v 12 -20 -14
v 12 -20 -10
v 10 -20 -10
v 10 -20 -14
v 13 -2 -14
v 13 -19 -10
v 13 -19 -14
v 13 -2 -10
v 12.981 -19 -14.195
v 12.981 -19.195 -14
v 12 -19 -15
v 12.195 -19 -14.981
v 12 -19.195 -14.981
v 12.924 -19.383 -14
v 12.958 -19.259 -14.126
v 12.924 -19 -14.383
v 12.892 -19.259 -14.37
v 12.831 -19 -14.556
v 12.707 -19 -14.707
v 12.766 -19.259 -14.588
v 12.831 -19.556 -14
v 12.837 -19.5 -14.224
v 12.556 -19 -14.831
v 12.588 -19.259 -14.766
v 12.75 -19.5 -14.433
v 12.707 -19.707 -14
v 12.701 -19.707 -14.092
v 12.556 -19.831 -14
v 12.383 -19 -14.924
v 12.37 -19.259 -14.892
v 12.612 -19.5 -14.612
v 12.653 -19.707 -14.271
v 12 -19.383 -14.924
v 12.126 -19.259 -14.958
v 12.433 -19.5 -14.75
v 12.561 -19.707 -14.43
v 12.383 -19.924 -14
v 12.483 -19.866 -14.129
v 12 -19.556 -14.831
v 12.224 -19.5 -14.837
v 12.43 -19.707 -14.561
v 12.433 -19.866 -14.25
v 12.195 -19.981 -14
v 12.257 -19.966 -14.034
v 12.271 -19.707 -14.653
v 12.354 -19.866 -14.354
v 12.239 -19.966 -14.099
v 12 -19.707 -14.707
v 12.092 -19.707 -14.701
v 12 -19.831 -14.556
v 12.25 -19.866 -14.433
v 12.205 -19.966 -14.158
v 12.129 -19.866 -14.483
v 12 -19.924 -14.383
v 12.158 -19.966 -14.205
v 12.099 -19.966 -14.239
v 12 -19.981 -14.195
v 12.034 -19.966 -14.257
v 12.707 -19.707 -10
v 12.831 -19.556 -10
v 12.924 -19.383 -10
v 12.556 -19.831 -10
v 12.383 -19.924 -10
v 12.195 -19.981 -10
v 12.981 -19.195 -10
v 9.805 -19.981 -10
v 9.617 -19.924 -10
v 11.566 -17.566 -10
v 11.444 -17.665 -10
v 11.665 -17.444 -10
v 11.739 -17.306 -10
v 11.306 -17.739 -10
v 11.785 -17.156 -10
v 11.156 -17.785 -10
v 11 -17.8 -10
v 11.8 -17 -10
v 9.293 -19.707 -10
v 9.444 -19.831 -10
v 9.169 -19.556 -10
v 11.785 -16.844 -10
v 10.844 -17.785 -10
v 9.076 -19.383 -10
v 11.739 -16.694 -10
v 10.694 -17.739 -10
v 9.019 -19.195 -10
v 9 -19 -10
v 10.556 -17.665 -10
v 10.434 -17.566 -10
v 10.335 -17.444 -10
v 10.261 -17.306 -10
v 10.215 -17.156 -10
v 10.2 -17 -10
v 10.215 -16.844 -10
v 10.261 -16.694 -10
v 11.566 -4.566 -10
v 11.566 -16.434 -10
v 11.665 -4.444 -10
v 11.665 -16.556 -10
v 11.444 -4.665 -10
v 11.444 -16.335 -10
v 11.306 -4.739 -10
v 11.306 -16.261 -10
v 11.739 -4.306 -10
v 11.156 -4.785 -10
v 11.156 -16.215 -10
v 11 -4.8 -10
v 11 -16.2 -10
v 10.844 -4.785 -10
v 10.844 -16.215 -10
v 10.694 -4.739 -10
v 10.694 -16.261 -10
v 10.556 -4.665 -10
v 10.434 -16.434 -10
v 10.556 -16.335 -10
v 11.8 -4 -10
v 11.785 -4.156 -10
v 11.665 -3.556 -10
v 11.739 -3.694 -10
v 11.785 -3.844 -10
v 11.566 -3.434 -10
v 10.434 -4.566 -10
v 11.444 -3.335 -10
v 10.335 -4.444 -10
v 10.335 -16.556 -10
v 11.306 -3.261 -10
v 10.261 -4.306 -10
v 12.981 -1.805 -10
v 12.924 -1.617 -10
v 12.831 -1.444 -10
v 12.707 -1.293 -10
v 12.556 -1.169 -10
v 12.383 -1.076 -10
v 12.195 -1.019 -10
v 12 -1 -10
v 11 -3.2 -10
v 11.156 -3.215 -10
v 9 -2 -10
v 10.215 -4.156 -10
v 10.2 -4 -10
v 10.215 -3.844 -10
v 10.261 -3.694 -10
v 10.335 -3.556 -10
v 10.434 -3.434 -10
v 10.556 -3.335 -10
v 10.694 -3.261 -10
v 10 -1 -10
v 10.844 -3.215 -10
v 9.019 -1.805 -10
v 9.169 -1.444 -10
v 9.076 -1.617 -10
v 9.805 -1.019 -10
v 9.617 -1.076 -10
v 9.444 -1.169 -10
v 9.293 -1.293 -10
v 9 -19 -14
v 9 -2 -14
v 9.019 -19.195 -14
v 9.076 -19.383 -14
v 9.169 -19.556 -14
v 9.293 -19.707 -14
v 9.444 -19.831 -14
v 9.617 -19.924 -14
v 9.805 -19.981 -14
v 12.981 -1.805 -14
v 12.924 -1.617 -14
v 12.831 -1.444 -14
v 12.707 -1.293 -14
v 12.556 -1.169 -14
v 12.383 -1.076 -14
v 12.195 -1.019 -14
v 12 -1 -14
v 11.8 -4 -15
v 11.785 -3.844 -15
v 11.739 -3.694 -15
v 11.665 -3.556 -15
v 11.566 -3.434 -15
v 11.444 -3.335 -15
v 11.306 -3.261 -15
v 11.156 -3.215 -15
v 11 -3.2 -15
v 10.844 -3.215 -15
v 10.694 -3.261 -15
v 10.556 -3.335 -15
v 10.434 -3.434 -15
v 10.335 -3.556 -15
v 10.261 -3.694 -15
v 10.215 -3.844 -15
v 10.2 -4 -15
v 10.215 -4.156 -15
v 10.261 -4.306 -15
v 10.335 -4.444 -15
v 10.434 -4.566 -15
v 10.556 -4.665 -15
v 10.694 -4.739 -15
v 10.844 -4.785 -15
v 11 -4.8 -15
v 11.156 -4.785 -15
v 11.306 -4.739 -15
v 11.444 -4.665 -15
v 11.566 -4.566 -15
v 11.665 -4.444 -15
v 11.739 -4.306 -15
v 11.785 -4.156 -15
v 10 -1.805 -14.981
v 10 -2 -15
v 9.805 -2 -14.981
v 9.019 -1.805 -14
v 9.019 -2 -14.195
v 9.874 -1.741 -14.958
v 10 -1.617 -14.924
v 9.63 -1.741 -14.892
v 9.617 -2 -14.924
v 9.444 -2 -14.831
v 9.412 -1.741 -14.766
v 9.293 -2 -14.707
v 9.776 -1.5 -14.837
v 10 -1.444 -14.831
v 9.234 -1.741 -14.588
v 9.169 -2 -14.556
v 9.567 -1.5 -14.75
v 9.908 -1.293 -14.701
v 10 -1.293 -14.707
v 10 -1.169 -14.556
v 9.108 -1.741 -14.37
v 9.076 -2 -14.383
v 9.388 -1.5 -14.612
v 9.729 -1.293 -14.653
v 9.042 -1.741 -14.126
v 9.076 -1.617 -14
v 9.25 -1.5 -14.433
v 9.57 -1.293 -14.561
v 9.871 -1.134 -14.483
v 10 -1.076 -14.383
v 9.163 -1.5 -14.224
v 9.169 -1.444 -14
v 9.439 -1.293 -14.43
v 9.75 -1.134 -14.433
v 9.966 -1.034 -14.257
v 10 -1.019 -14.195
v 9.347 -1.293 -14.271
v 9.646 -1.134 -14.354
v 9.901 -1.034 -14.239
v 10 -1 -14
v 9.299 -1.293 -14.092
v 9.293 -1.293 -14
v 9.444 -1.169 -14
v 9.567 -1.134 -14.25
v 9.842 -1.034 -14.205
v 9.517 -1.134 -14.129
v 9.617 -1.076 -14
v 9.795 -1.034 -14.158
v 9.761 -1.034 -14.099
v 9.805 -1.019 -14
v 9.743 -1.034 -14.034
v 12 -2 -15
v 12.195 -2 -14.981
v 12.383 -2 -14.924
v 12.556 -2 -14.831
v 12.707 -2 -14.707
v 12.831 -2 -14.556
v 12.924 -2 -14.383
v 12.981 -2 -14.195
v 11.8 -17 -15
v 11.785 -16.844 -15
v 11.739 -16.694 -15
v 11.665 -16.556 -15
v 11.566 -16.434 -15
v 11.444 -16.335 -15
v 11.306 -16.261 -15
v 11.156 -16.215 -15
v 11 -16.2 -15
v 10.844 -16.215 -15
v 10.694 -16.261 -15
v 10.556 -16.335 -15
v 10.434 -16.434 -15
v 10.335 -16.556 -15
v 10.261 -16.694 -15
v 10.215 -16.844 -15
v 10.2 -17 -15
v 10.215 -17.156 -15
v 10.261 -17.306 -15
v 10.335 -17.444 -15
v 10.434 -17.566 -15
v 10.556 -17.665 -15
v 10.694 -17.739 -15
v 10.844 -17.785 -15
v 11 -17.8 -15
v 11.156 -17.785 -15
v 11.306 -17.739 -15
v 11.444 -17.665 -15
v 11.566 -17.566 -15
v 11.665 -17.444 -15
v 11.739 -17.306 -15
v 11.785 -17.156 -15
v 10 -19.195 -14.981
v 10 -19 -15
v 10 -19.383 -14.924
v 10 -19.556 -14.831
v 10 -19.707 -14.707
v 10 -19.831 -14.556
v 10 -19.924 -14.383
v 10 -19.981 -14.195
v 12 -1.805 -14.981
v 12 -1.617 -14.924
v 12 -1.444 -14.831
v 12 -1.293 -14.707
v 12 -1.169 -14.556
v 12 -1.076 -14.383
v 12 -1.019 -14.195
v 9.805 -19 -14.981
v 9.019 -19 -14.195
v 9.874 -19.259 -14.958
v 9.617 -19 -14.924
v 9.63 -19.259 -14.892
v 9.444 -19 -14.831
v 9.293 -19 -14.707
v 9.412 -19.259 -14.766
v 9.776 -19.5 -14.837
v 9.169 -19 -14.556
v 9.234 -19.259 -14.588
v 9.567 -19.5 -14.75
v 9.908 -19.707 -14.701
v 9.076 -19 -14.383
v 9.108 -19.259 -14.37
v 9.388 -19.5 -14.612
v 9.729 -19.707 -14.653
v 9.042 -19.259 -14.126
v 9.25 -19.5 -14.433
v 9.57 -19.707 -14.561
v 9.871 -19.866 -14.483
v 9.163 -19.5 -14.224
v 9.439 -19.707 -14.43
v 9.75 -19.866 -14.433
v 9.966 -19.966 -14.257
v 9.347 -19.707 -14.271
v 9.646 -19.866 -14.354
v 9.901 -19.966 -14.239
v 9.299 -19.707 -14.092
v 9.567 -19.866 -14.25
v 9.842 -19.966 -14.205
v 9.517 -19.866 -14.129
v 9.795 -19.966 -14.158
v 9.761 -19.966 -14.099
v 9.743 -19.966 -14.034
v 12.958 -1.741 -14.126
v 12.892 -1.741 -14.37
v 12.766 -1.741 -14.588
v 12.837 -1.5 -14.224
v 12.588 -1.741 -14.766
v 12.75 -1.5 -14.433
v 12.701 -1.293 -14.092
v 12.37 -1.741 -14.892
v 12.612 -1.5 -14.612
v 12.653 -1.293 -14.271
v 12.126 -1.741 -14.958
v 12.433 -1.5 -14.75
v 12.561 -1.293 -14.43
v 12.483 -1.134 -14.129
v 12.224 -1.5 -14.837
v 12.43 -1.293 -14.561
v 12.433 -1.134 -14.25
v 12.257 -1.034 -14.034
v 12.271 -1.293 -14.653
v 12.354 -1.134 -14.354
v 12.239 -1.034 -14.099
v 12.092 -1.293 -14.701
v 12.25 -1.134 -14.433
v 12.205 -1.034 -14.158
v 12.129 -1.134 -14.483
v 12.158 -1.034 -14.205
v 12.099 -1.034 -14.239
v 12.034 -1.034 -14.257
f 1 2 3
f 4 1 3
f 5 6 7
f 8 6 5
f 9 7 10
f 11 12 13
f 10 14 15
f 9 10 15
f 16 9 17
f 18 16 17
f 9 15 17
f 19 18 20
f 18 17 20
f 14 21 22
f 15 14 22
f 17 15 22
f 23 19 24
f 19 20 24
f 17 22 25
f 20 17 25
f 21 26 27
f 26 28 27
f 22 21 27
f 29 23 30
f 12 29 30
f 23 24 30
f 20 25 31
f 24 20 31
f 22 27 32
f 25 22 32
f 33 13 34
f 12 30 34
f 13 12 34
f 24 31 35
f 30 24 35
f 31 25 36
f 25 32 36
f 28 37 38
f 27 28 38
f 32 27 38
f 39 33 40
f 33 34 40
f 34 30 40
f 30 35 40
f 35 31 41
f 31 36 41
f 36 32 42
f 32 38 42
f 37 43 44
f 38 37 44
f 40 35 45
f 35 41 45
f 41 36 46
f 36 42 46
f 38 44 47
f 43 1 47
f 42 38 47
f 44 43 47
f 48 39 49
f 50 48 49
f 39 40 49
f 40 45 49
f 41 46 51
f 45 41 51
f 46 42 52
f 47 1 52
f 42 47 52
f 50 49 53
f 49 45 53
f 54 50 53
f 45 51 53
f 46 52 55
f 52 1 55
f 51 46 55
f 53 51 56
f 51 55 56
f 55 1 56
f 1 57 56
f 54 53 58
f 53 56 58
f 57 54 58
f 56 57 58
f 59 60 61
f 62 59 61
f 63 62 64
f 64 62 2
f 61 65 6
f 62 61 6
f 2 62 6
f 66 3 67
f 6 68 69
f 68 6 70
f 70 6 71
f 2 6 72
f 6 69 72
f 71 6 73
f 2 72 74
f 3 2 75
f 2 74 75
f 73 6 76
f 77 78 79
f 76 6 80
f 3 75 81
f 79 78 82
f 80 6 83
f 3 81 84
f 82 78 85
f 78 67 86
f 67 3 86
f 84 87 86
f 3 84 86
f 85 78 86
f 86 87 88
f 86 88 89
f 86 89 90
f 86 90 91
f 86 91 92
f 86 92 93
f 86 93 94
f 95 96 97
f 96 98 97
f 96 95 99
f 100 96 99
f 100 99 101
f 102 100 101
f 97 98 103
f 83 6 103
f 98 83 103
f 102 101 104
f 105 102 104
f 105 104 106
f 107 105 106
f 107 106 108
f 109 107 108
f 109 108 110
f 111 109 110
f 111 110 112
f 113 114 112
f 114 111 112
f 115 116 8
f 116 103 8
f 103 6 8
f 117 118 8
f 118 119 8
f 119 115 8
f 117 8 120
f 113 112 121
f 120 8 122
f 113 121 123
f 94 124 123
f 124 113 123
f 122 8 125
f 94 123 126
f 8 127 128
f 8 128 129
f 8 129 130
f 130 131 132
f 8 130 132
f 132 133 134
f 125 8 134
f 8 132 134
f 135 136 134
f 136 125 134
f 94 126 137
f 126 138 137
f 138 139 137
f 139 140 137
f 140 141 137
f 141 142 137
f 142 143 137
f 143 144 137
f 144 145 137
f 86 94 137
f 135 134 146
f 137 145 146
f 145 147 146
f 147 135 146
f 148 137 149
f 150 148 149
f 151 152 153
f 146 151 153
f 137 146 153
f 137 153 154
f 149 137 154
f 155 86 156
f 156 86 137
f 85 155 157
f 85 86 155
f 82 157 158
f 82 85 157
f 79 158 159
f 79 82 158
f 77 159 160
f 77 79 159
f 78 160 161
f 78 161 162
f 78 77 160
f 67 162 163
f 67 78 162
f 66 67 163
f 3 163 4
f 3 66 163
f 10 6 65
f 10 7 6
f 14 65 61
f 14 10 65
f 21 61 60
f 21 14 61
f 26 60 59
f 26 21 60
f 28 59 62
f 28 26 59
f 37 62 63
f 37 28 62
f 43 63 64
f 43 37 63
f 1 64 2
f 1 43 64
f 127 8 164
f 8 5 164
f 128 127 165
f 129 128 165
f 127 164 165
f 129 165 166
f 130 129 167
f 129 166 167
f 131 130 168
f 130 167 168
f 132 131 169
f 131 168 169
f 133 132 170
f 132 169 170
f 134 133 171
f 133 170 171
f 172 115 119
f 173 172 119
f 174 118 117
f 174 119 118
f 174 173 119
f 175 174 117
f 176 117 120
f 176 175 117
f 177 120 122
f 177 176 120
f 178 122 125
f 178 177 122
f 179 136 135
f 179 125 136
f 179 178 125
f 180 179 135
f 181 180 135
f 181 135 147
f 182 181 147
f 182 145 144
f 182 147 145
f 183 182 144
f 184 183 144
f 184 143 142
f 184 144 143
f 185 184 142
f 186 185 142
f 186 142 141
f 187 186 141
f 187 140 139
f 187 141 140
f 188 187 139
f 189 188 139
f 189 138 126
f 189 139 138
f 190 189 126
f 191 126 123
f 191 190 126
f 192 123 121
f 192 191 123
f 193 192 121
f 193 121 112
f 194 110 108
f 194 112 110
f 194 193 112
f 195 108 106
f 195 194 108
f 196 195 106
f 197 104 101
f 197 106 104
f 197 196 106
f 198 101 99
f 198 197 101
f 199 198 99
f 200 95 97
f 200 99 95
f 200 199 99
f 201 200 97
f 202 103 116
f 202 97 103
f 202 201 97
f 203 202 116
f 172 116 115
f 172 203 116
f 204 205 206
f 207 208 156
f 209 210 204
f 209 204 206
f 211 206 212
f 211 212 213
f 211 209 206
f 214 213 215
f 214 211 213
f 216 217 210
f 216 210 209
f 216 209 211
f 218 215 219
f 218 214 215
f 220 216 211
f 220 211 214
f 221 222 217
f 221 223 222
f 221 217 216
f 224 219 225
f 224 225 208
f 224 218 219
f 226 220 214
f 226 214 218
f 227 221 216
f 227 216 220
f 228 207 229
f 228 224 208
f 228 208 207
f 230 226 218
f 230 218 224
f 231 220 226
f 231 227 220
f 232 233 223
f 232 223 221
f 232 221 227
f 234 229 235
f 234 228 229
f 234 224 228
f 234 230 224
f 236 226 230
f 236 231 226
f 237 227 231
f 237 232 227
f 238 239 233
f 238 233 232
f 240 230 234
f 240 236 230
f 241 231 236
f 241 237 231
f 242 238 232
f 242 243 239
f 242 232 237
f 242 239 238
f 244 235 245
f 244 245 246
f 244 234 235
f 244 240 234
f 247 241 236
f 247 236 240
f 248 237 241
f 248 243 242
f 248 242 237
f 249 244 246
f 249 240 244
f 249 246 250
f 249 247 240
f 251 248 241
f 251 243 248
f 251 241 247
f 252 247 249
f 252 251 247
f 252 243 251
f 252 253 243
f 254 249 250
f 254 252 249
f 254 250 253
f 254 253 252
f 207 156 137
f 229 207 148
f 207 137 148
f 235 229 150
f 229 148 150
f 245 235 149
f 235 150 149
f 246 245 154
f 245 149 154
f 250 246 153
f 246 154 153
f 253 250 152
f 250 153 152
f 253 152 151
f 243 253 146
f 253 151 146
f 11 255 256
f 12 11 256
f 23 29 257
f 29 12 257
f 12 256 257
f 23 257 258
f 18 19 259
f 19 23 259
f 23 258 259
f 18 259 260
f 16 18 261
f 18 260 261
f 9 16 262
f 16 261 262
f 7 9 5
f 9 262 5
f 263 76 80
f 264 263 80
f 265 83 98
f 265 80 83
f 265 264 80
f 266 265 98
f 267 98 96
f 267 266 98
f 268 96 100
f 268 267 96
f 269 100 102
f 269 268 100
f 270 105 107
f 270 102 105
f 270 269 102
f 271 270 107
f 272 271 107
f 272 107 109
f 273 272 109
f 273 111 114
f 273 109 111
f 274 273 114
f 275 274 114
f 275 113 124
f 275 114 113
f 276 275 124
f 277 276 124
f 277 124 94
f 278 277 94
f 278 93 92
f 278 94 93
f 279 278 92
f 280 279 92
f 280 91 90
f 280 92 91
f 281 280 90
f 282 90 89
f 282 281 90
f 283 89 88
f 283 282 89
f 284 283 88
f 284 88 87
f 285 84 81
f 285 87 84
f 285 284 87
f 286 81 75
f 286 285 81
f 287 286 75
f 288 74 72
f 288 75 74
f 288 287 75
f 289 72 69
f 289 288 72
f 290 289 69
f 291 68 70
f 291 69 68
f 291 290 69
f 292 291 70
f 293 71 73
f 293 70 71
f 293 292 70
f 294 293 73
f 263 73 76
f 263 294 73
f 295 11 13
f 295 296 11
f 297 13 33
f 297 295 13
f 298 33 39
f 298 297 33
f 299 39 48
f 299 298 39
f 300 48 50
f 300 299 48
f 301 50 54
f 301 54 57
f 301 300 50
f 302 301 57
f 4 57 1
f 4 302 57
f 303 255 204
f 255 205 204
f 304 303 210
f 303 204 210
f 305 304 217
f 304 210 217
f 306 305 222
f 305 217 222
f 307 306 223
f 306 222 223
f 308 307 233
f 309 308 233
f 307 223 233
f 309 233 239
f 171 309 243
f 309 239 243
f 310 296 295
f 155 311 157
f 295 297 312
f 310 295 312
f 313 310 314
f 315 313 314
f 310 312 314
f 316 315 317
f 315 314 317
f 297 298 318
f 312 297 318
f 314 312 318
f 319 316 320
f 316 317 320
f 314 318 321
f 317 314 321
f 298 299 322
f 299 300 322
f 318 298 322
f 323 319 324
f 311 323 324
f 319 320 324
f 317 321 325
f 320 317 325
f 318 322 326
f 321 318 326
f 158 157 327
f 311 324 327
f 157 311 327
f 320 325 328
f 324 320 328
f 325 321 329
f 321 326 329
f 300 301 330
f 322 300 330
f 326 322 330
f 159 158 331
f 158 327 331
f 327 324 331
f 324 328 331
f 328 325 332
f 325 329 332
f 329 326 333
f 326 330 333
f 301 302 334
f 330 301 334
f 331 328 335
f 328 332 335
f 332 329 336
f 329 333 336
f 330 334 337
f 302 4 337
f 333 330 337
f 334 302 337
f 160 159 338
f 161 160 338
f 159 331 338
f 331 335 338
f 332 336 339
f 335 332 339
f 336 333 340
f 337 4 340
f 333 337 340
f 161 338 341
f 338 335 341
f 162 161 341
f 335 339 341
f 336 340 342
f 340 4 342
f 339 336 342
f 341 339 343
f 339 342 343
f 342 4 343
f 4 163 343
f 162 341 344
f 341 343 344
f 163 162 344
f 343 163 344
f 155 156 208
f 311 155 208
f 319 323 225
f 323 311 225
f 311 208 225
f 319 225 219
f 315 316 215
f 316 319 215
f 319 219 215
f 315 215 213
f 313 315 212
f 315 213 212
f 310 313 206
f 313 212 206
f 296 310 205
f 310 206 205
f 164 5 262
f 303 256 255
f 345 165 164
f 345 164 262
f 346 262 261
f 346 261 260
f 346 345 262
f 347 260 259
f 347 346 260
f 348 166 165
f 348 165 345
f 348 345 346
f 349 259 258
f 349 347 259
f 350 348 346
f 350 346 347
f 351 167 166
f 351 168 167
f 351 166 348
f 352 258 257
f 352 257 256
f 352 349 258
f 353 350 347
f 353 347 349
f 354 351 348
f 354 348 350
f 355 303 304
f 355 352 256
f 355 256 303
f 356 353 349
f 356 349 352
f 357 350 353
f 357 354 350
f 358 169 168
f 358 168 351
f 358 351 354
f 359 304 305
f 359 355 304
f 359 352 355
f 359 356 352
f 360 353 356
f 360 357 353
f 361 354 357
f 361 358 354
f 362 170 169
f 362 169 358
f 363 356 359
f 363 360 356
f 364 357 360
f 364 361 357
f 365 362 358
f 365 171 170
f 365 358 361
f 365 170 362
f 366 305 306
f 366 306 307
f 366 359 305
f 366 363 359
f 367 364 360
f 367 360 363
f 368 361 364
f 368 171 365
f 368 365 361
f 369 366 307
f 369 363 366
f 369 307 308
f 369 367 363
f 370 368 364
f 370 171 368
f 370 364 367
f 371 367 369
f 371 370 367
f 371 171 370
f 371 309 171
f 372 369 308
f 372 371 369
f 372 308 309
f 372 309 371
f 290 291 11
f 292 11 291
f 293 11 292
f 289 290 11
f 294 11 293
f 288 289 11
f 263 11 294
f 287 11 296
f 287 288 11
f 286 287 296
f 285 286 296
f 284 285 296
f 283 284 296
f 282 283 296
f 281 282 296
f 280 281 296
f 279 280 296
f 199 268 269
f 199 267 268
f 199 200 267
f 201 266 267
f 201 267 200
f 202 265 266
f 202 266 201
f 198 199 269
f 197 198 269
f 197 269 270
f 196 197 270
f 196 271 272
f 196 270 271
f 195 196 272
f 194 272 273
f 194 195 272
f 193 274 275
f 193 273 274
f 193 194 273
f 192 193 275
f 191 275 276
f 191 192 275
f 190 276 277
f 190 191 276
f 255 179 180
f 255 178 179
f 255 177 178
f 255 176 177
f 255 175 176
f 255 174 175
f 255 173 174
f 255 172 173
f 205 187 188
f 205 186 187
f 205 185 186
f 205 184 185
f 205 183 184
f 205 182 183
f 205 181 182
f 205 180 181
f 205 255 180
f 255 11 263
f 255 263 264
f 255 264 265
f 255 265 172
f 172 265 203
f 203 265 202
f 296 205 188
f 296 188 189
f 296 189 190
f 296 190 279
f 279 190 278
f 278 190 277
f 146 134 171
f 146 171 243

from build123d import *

# Parameters (mm, degrees)
CYLINDER051_R          = 0.8
CYLINDER051_DEPTH      = 10
CYLINDER050_R          = 0.8
CYLINDER050_DEPTH      = 10
CYLINDER047_R          = 0.75
CYLINDER047_DEPTH      = 10
CYLINDER046_R          = 0.75
CYLINDER046_DEPTH      = 10
BOX020_W               = 4
BOX020_H               = 19
BOX020_DEPTH           = 5
FILLET008_R            = 1
FILLET009_R            = 1
FILLET010_R            = 1
FILLET011_R            = 1
CUT066_PLACEMENT_ANGLE = 180


with BuildPart() as cilindro051:
    # Cylinder051 → Cylinder051 (new body)
    with BuildSketch(Plane(origin=(11, -17, -17), x_dir=(1, 0, 0), z_dir=(0, 0, 1))):
        Circle(CYLINDER051_R)
    extrude(amount=CYLINDER051_DEPTH)


with BuildPart() as cilindro050:
    # Cylinder050 → Cylinder050 (new body)
    with BuildSketch(Plane(origin=(11, -4, -17), x_dir=(1, 0, 0), z_dir=(0, 0, 1))):
        Circle(CYLINDER050_R)
    extrude(amount=CYLINDER050_DEPTH)


with BuildPart() as cilindro047:
    # Cylinder047 → Cylinder047 (new body)
    with BuildSketch(Plane(origin=(-39, 66, 48), x_dir=(1, 0, 0), z_dir=(0, 0, 1))):
        Circle(CYLINDER047_R)
    extrude(amount=CYLINDER047_DEPTH)


with BuildPart() as cilindro046:
    # Cylinder046 → Cylinder046 (new body)
    with BuildSketch(Plane(origin=(-39, 53, 48), x_dir=(1, 0, 0), z_dir=(0, 0, 1))):
        Circle(CYLINDER046_R)
    extrude(amount=CYLINDER046_DEPTH)


with BuildPart() as cut070:
    # Box020 → Box020 (new body)
    with BuildSketch(Plane(origin=(-2, 50, 45), x_dir=(1, 0, 0), z_dir=(0, 0, 1))):
        with Locations((2, 9.5)):
            Rectangle(BOX020_W, BOX020_H)
    extrude(amount=BOX020_DEPTH)

    # Fillet008
    fillet008_edges = [cut070.edges().sort_by_distance(p)[0] for p in [
        (2, 59.5, 50),
    ]]
    fillet(fillet008_edges, radius=FILLET008_R)

    # Fillet009
    fillet009_edges = [cut070.edges().sort_by_distance(p)[0] for p in [
        (-2, 59.5, 50),
    ]]
    fillet(fillet009_edges, radius=FILLET009_R)

    # Fillet010
    fillet010_edges = [cut070.edges().sort_by_distance(p)[0] for p in [
        (0, 69, 50),
    ]]
    fillet(fillet010_edges, radius=FILLET010_R)

    # Fillet011
    fillet011_edges = [cut070.edges().sort_by_distance(p)[0] for p in [
        (0, 50, 50),
    ]]
    fillet(fillet011_edges, radius=FILLET011_R)


with BuildPart() as cut070_1:
    # Fillet011 placement: moved
    add(cut070.part.moved(Location((-39, 0, 0))))

    # Cut065: cut Cilindro046
    add(cilindro046.part, mode=Mode.SUBTRACT)

    # Cut066: cut Cilindro047
    add(cilindro047.part, mode=Mode.SUBTRACT)


with BuildPart() as cut070_2:
    # Cut066 placement: moved
    add(cut070_1.part.moved(Location((-28, -70, 35))).rotate(Axis((-28, -70, 35), (0, 1, 0)), CUT066_PLACEMENT_ANGLE))

    # Cut069: cut Cilindro050
    add(cilindro050.part, mode=Mode.SUBTRACT)

    # Cut070: cut Cilindro051
    add(cilindro051.part, mode=Mode.SUBTRACT)


solid = cut070_2.part
